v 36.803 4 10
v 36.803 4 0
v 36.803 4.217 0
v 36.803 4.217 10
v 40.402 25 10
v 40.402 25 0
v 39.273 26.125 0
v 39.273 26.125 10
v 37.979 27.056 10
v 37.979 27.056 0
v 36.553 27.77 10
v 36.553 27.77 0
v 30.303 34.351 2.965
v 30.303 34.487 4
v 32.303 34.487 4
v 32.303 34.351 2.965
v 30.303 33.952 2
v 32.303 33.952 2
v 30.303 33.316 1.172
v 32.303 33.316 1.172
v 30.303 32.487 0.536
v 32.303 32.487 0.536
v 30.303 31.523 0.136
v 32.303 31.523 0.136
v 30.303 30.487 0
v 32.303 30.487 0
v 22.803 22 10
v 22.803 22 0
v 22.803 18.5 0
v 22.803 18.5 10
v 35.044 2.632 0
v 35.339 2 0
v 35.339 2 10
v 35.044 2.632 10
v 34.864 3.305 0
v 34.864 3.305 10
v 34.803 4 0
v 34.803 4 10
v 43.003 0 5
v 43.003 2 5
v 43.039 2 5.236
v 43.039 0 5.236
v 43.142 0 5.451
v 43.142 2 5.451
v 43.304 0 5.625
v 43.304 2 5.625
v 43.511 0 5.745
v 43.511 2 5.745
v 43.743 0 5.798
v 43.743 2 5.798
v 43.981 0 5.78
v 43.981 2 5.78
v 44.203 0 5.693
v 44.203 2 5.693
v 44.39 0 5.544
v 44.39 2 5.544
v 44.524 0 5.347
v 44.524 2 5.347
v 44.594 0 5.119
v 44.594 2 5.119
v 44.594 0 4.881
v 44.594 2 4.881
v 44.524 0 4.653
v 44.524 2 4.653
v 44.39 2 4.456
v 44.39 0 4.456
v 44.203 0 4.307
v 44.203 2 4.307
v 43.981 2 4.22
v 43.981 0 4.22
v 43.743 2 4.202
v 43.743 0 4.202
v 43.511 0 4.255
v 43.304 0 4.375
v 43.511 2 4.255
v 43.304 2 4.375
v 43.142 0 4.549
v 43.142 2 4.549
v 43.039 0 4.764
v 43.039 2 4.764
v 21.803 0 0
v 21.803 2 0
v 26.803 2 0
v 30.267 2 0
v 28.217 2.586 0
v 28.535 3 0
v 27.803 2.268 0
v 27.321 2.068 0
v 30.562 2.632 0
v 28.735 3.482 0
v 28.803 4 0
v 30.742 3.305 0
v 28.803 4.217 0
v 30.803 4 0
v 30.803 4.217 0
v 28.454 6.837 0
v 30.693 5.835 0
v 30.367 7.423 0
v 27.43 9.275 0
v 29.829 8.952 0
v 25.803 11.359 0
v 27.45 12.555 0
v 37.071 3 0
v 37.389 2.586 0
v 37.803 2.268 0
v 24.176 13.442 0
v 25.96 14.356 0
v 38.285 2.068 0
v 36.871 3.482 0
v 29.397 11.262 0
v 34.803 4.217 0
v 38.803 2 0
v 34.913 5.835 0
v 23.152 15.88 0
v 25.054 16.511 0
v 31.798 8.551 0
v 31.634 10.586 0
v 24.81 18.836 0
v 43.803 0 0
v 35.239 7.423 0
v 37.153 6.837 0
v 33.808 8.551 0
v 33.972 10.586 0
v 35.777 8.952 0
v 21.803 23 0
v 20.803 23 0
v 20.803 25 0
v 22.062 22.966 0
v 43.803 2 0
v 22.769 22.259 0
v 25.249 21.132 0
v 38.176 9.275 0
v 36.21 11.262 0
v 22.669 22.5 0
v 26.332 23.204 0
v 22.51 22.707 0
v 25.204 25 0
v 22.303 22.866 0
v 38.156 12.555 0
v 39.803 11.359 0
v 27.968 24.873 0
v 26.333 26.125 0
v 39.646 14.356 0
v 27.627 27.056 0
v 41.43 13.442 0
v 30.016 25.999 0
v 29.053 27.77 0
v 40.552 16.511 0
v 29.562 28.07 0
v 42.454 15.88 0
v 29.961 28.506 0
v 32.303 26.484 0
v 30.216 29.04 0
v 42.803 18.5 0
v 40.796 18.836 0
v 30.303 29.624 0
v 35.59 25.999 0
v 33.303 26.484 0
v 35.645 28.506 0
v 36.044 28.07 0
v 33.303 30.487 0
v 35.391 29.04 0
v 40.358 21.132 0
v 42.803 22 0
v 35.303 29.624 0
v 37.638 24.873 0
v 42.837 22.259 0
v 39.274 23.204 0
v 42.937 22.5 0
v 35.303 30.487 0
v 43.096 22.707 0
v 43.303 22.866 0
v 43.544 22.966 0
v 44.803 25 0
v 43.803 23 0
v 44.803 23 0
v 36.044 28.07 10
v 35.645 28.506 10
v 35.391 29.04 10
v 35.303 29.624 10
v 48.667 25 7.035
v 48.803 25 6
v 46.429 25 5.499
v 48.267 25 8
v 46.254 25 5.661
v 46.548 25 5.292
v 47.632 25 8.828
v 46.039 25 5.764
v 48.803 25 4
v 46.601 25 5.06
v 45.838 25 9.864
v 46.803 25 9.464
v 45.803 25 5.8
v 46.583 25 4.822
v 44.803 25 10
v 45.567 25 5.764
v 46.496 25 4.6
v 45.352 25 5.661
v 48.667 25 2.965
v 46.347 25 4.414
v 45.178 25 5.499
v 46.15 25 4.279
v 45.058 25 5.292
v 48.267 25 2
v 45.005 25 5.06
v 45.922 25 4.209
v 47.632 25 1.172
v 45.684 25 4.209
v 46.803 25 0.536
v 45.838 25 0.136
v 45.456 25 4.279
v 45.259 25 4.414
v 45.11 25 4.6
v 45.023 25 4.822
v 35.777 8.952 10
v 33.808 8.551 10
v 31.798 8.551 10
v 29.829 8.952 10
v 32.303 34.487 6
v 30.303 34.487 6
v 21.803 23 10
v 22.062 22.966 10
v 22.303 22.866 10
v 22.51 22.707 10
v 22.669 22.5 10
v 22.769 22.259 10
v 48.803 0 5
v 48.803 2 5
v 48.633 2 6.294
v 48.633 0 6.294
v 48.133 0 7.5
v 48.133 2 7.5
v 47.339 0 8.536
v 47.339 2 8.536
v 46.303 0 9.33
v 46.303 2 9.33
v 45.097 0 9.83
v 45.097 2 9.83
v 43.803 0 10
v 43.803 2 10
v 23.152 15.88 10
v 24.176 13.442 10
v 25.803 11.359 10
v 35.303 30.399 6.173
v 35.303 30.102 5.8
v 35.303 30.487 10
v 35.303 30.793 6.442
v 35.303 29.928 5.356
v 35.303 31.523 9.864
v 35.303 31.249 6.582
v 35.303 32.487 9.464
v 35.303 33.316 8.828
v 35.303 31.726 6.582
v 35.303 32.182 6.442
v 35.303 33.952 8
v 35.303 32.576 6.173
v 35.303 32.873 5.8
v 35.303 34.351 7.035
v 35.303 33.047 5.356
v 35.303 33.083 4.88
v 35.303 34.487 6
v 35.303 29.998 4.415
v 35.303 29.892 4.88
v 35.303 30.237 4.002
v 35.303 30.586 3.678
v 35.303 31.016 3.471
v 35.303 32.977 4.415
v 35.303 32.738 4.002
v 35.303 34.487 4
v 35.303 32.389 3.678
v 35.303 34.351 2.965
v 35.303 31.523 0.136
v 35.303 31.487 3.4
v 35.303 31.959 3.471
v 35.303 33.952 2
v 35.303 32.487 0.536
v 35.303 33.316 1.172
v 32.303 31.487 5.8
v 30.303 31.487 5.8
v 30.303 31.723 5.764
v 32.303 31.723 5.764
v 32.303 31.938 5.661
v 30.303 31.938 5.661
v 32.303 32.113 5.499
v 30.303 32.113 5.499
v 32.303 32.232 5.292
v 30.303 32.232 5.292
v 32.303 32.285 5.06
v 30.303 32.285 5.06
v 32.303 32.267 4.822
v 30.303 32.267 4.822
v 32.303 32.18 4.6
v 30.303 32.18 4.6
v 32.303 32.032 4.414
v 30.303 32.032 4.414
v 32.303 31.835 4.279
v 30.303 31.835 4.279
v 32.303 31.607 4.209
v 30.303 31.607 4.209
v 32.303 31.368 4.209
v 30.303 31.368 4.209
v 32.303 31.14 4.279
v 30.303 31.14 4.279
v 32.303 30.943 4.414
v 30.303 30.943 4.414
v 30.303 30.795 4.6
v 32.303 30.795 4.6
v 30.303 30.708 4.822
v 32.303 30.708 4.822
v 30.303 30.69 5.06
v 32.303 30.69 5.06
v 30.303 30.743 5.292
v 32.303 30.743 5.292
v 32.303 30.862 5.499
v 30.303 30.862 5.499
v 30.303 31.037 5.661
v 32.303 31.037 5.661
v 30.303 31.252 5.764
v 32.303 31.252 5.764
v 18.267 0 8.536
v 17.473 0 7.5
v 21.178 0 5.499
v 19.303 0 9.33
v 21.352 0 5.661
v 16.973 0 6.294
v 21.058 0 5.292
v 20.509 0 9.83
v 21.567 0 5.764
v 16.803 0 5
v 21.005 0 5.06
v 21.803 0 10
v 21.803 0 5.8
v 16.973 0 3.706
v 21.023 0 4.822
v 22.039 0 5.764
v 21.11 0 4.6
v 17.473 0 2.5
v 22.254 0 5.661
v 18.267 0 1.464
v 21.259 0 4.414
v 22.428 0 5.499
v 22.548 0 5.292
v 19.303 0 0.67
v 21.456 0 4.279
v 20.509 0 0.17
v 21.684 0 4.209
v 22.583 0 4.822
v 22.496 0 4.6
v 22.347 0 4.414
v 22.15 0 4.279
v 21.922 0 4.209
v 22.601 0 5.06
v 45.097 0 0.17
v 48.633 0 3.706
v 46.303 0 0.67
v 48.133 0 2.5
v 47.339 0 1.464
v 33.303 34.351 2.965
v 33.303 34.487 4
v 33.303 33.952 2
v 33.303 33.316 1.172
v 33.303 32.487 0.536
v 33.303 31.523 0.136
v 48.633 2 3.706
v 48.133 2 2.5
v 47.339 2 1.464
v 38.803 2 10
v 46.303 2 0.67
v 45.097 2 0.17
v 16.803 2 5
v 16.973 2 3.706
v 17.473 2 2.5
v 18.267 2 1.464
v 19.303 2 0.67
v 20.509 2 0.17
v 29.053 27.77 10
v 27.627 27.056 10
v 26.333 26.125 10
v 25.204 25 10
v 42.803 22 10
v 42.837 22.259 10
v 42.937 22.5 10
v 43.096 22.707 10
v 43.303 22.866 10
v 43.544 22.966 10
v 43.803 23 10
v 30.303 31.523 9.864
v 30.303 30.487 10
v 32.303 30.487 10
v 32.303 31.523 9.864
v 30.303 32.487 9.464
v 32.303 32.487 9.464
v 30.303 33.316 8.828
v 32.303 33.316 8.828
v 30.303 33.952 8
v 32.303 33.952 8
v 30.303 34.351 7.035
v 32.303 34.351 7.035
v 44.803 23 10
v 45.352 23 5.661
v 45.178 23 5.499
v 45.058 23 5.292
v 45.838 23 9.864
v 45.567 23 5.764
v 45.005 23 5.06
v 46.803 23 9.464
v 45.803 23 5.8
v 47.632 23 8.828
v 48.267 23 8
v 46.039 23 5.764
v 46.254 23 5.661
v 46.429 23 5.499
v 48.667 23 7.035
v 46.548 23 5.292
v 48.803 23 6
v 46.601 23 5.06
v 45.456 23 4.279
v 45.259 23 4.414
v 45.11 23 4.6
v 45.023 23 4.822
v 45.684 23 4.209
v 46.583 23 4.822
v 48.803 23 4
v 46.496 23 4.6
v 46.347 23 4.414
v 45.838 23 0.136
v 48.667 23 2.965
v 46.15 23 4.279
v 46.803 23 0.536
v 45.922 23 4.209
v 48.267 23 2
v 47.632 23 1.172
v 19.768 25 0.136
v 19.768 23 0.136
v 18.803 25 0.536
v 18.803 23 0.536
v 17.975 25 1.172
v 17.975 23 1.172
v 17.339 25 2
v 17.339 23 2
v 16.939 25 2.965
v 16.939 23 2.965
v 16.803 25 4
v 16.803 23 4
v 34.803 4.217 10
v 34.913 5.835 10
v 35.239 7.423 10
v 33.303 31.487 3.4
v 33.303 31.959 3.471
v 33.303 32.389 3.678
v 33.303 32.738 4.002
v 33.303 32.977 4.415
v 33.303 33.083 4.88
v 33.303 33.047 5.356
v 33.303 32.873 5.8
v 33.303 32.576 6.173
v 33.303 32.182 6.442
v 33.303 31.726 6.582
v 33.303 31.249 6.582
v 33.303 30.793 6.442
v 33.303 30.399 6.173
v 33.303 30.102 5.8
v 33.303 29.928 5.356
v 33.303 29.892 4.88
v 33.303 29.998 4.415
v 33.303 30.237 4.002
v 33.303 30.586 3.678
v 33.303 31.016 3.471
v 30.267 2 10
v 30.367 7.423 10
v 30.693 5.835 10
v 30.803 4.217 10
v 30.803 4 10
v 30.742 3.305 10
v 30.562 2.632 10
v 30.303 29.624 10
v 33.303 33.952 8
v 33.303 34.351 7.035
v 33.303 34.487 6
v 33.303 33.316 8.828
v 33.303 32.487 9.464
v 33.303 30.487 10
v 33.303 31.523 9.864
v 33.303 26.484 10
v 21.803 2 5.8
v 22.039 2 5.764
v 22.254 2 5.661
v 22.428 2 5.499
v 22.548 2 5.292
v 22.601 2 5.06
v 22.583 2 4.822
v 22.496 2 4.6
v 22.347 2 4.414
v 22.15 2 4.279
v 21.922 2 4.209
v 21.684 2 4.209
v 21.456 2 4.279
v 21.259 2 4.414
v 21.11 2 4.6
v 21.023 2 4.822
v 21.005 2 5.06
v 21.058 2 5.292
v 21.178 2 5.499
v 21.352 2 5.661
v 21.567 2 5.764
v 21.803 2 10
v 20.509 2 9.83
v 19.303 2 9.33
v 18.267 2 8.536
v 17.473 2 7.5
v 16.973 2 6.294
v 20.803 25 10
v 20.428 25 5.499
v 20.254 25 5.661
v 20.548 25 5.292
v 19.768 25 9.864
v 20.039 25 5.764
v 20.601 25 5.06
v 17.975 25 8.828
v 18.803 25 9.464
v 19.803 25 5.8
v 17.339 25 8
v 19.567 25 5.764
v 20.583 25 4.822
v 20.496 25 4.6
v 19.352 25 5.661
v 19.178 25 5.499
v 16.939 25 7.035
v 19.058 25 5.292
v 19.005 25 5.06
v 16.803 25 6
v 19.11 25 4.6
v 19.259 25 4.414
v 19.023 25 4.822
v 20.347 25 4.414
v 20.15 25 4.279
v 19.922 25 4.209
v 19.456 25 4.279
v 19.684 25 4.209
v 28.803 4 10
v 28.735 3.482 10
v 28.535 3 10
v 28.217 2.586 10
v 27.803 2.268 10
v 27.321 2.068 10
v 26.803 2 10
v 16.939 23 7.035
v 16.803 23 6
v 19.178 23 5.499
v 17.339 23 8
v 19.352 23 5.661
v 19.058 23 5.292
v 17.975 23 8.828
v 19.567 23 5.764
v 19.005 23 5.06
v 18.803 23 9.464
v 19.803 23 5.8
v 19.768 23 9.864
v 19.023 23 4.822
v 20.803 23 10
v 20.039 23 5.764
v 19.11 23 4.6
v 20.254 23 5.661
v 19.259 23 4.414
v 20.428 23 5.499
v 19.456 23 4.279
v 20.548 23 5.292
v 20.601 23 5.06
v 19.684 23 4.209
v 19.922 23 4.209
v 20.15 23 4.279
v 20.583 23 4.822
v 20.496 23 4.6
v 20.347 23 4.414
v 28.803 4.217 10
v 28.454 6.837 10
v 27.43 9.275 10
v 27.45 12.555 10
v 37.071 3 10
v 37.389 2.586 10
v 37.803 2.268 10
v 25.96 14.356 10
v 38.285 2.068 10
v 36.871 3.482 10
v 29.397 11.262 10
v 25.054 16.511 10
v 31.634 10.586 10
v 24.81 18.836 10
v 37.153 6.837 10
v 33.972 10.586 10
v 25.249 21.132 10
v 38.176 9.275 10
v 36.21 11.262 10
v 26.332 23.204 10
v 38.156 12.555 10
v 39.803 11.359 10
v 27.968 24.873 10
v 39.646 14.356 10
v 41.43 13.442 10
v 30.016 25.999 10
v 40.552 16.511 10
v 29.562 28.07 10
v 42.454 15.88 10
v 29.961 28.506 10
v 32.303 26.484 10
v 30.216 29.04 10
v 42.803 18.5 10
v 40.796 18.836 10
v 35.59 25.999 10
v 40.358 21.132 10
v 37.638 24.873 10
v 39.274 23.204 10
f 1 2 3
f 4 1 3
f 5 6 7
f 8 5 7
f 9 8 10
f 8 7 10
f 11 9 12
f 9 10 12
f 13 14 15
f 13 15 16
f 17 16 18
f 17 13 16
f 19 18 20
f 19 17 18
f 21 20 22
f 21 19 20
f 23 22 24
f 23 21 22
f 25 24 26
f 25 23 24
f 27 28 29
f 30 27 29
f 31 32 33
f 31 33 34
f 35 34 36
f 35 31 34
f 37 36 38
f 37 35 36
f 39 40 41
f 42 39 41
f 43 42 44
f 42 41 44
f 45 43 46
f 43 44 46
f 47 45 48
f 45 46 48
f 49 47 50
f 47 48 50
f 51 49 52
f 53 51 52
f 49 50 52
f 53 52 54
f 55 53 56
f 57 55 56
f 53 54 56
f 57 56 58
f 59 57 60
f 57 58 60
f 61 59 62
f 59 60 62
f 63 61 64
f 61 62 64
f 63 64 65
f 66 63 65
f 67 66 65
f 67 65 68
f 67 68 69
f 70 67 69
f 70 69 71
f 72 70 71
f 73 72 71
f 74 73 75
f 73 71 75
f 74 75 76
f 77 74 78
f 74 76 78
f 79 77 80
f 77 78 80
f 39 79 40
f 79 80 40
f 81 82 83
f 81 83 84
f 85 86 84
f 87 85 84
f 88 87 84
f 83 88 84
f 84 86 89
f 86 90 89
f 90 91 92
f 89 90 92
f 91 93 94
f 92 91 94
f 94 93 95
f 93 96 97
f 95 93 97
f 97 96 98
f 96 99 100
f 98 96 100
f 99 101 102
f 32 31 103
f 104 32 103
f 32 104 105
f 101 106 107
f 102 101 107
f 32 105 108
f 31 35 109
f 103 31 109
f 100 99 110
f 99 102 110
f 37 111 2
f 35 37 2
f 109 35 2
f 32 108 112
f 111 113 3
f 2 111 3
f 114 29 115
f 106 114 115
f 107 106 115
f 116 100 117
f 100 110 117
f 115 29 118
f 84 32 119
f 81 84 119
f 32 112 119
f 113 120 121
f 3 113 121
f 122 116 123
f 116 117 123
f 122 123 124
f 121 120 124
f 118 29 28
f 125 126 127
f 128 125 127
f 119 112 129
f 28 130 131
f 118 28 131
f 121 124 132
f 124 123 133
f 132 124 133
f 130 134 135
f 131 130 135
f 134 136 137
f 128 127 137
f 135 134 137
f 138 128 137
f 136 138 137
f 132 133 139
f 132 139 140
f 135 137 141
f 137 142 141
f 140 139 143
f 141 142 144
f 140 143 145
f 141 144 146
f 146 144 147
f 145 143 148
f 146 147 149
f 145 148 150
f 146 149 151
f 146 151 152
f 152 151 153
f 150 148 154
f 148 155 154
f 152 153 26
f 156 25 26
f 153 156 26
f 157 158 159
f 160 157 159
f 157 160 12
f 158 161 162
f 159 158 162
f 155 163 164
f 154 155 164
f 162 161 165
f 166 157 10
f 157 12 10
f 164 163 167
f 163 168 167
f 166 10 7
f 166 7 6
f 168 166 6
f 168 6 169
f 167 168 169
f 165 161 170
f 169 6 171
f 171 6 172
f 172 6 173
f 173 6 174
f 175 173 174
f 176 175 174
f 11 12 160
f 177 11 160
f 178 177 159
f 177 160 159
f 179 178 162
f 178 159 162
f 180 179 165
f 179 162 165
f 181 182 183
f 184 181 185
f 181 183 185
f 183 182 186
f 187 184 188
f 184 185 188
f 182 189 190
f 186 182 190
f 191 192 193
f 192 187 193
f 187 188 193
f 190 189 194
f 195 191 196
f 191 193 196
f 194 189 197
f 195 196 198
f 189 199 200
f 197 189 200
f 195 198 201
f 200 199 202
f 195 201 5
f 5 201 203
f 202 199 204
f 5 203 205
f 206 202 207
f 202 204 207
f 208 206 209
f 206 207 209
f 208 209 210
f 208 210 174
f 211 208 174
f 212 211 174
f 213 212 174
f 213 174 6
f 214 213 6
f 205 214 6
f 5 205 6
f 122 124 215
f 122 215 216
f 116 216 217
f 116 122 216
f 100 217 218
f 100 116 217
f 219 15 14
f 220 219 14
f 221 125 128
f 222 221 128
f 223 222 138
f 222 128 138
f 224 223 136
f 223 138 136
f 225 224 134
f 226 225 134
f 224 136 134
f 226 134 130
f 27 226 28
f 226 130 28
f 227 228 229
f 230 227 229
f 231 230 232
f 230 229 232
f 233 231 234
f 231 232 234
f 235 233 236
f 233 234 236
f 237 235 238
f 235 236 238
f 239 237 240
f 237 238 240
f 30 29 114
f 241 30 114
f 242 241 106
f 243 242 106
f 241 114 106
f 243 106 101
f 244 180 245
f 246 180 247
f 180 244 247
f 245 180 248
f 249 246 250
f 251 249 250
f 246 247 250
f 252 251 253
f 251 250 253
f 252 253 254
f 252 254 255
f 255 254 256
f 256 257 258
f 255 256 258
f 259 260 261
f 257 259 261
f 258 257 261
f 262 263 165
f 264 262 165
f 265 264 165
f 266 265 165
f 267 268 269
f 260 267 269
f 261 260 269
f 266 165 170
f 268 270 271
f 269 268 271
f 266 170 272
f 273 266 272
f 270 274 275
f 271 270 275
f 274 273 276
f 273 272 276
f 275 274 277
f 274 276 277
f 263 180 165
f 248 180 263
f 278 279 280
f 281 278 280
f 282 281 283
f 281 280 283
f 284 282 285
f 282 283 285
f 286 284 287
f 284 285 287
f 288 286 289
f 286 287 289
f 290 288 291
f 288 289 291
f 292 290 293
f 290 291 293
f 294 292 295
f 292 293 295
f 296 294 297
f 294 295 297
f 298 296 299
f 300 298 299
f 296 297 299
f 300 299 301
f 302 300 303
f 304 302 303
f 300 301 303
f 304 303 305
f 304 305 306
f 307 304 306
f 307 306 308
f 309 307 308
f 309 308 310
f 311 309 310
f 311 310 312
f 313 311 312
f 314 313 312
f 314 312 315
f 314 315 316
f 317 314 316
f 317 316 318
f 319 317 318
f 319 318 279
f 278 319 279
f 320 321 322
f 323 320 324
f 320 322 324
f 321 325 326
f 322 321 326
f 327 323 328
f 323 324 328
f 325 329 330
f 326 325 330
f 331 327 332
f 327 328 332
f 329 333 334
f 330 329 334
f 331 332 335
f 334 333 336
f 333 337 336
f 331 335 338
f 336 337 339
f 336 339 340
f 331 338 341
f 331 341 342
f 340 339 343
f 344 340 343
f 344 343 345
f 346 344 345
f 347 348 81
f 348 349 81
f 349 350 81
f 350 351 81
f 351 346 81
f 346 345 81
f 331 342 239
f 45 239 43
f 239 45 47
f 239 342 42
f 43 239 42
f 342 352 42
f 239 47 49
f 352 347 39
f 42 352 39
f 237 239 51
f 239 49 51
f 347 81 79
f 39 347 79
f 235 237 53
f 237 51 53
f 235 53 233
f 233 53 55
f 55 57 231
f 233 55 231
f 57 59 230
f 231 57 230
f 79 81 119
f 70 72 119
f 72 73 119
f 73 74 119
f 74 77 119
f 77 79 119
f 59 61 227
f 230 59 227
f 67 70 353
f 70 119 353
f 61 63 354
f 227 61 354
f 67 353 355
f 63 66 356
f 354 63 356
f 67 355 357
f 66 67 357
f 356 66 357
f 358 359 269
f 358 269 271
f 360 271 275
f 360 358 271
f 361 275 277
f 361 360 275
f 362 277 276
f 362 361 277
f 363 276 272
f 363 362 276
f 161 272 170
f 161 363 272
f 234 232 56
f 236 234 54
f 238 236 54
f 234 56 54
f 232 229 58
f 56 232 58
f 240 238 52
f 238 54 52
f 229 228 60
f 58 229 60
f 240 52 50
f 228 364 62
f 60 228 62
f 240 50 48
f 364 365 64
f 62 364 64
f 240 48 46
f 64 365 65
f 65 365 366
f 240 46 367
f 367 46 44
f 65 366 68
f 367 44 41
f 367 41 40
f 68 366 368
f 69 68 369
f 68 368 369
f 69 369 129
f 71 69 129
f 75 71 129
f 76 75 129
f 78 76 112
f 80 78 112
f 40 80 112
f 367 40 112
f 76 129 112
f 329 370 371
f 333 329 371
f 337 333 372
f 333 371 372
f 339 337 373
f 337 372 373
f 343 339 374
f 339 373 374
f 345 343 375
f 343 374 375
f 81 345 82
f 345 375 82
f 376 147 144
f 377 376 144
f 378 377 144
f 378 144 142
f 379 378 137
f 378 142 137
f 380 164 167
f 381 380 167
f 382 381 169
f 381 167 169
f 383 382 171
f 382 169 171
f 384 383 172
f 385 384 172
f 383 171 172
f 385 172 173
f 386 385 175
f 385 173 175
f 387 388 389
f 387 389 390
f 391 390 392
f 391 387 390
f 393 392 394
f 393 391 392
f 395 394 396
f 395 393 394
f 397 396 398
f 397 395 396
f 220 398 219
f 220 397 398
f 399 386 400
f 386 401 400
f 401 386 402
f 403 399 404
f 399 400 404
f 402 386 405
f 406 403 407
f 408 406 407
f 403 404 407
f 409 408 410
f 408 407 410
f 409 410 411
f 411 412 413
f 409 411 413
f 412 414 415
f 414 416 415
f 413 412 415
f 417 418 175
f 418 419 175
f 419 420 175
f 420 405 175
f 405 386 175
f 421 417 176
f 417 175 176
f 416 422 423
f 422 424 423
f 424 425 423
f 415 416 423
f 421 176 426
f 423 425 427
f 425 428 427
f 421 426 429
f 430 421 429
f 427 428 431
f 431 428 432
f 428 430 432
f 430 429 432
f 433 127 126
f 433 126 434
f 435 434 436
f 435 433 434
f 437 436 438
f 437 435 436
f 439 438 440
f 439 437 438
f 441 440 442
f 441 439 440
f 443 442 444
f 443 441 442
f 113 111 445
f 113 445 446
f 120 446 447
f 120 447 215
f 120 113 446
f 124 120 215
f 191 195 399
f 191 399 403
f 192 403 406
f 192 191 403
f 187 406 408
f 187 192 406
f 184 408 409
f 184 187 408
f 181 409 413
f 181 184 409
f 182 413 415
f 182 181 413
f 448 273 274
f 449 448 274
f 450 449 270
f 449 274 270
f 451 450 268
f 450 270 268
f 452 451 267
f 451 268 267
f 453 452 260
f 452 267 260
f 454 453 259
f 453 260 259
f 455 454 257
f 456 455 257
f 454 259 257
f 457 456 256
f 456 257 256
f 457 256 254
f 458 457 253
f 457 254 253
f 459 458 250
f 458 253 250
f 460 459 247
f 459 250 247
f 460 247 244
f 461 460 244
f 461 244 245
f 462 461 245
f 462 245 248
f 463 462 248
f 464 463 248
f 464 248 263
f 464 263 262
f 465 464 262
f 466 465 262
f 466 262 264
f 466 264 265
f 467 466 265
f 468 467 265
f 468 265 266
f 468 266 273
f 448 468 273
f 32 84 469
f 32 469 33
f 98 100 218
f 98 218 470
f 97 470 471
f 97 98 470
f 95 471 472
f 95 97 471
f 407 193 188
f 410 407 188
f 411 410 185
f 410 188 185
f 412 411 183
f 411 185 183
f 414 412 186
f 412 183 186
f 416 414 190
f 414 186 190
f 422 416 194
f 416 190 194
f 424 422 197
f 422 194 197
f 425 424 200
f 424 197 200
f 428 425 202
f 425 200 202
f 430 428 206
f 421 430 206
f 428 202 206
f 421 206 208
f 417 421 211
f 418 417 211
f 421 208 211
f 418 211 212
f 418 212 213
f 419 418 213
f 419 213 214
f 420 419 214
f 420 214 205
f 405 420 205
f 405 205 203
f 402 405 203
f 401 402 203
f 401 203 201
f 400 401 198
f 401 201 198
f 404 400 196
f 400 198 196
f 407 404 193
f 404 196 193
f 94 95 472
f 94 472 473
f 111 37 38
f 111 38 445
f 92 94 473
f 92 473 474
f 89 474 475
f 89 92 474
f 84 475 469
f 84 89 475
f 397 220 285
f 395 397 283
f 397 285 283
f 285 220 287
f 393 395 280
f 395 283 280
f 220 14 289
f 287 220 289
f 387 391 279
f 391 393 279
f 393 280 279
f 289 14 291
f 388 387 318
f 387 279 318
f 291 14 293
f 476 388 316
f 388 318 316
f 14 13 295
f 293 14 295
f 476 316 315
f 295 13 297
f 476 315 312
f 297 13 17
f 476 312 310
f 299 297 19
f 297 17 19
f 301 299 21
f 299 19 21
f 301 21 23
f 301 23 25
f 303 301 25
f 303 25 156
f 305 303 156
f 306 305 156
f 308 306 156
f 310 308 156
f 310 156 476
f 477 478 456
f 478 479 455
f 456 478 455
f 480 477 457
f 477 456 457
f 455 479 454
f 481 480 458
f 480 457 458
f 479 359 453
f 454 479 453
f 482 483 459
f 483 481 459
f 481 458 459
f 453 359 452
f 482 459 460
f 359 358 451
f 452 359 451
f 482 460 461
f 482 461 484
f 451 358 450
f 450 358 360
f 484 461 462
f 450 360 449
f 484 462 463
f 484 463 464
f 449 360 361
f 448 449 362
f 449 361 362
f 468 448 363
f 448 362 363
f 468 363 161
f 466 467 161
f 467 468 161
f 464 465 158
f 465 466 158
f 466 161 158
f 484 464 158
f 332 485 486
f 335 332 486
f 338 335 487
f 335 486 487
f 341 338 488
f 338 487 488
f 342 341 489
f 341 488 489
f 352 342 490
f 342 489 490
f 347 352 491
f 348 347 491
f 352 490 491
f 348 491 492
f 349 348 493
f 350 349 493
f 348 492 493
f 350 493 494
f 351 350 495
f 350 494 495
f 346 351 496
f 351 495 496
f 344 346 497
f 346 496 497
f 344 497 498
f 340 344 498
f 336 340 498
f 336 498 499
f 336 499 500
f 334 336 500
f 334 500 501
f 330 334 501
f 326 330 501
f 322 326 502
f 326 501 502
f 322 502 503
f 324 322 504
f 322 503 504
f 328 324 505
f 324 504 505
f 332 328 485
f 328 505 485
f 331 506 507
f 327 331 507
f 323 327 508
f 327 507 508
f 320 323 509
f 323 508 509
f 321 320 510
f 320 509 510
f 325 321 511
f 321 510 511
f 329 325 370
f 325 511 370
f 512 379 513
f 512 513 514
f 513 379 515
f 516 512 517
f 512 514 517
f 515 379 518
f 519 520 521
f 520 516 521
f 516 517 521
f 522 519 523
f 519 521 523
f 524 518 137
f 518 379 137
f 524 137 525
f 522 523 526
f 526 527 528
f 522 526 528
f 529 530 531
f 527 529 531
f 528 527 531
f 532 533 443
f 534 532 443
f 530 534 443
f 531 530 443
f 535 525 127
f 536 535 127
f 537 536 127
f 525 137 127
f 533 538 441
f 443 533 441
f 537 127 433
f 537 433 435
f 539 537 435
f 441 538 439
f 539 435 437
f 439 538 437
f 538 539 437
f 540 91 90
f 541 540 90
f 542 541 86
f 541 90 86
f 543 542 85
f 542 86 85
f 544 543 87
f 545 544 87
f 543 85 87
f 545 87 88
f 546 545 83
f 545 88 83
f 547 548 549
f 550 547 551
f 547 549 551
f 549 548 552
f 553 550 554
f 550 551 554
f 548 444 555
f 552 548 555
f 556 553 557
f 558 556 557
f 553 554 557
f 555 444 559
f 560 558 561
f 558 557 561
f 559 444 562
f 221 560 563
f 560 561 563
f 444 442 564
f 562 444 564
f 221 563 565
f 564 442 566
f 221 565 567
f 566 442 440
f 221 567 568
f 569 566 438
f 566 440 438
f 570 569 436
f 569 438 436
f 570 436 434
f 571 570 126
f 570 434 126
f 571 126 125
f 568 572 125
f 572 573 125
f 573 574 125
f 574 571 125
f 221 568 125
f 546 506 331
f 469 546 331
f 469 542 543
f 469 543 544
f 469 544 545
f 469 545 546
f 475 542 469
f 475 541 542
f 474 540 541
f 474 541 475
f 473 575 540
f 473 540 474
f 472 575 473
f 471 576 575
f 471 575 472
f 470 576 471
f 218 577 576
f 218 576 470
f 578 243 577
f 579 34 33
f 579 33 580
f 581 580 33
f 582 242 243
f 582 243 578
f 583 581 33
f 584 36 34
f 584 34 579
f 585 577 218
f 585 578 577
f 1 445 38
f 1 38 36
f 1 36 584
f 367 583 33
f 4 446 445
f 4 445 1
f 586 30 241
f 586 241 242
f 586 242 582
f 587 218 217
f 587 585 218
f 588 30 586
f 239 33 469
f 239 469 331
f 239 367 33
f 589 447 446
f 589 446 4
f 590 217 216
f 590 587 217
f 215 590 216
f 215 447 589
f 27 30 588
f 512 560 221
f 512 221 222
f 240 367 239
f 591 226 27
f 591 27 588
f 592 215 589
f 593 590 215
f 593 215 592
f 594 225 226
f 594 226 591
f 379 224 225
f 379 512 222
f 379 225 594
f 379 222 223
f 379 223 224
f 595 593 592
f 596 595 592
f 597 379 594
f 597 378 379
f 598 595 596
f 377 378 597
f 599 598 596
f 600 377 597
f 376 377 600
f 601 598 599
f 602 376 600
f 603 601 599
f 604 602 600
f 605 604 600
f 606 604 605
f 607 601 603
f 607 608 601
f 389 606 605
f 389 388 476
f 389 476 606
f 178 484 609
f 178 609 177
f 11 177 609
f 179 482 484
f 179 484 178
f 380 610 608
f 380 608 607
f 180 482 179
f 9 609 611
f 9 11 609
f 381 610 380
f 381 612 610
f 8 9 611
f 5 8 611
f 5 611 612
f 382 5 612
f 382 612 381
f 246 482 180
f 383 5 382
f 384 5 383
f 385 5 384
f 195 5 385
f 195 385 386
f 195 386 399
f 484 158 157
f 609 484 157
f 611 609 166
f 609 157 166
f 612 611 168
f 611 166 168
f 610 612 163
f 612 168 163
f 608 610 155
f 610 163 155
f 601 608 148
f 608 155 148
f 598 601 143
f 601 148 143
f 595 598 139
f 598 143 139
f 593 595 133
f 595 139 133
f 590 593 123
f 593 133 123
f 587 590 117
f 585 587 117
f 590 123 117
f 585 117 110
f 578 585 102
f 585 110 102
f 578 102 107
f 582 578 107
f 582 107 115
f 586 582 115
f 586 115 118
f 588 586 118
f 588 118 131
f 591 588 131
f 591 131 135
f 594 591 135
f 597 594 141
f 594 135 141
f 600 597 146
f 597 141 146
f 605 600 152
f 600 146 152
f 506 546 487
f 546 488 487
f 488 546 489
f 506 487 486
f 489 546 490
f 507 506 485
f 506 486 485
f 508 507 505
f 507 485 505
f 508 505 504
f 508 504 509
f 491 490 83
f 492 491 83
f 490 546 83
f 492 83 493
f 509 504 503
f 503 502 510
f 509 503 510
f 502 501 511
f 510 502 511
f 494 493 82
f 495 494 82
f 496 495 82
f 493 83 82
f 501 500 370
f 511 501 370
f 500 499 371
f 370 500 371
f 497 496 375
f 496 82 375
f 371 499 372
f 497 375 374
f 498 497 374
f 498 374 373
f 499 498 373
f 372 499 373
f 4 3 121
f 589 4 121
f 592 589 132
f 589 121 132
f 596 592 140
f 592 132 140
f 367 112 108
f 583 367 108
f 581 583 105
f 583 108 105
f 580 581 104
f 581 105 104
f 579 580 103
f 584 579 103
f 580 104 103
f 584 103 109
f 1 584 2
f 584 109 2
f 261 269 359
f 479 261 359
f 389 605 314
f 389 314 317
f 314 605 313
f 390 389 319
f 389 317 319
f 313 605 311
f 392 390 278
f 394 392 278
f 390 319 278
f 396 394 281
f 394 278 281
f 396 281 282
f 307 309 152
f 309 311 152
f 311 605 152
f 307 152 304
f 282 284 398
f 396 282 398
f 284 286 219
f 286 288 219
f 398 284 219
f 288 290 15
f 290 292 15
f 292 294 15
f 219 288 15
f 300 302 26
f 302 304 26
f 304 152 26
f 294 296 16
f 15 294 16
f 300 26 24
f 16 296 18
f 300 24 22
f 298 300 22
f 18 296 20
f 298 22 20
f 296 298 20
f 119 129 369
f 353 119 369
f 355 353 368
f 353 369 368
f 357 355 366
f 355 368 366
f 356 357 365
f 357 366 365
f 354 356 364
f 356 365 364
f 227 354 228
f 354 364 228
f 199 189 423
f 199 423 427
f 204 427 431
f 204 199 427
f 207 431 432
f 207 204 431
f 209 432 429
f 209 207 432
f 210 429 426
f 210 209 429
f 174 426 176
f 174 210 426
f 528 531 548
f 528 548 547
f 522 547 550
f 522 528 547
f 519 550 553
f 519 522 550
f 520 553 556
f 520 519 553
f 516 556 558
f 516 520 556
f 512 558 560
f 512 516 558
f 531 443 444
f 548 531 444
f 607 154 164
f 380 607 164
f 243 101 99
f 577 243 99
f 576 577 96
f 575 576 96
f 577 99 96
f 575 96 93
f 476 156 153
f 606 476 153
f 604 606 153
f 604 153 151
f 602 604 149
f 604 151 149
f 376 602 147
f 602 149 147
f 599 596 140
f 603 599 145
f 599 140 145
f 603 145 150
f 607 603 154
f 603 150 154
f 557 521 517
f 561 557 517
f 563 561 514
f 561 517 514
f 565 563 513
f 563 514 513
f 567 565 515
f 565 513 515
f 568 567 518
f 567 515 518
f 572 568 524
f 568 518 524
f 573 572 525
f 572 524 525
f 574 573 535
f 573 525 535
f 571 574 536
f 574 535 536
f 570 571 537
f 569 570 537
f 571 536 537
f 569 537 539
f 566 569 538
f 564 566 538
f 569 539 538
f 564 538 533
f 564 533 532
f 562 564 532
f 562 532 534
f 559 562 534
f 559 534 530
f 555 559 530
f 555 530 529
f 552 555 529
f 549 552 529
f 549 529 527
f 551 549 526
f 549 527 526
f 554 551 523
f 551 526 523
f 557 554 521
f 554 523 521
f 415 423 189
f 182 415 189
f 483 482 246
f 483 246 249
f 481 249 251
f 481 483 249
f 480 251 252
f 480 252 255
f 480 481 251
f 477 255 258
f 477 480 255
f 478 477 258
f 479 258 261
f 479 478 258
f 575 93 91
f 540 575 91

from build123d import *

# Parameters (mm, degrees)
BOSS_EXTRUDE1_DEPTH = 10
SKETCH3_R           = 0.8
CUT_EXTRUDE1_DEPTH  = 2
SKETCH4_R           = 0.8
CUT_EXTRUDE2_DEPTH  = 2
SKETCH5_R           = 0.8
CUT_EXTRUDE3_DEPTH  = 2
SKETCH6_R           = 0.8
CUT_EXTRUDE4_DEPTH  = 3
SKETCH7_R           = 1.6
CUT_EXTRUDE5_DEPTH  = 3
CUT_EXTRUDE6_DEPTH  = 10


with BuildPart() as part:
    # Sketch1 → Boss-Extrude1 (new body)
    with BuildSketch(Plane.XY):
        with BuildLine():
            Line((16.803004448, 0), (48.803096805, 0))
            Line((48.803096805, 0), (48.803096805, 2))
            Line((48.803096805, 2), (38.803096805, 2))
            ThreePointArc((38.803096805, 2), (37.388883243, 2.585786438), (36.803096805, 4))
            Line((36.803096805, 4), (36.803096805, 4.217123744))
            ThreePointArc((36.803096805, 4.217123744), (37.58355047, 8.090102619), (39.803089878, 11.358545383))
            ThreePointArc((39.803089878, 11.358545383), (42.022639537, 14.62700324), (42.803096805, 18.5))
            Line((42.803096805, 18.5), (42.803096805, 22))
            ThreePointArc((42.803096805, 22), (43.095990024, 22.707106781), (43.803096805, 23))
            Line((43.803096805, 23), (48.803096805, 23))
            Line((48.803096805, 23), (48.803096805, 25))
            Line((48.803096805, 25), (44.105786895, 25))
            Line((44.105786895, 25), (40.40245347, 25))
            ThreePointArc((40.40245347, 25), (38.644426823, 26.616603213), (36.553207437, 27.770234489))
            ThreePointArc((36.553207437, 27.770234489), (35.644914528, 28.506251313), (35.303235335, 29.624272825))
            Line((35.303235335, 29.624272825), (35.303235335, 34.487492178))
            Line((35.303235335, 34.487492178), (33.303050626, 34.487492178))
            Line((33.303050626, 34.487492178), (33.303050626, 26.484348185))
            ThreePointArc((33.303050626, 26.484348185), (32.803050626, 10.500011503), (32.303050626, 26.484348185))
            Line((32.303050626, 26.484348185), (32.303050626, 34.487492178))
            Line((32.303050626, 34.487492178), (30.303050626, 34.487492178))
            Line((30.303050626, 34.487492178), (30.303050626, 29.624347545))
            ThreePointArc((30.303050626, 29.624347545), (29.961362151, 28.506312265), (29.05304774, 27.770296755))
            ThreePointArc((29.05304774, 27.770296755), (26.961741815, 26.616651708), (25.203647783, 25))
            Line((25.203647783, 25), (21.500314358, 25))
            Line((21.500314358, 25), (16.803004448, 25))
            Line((16.803004448, 25), (16.803004448, 23))
            Line((16.803004448, 23), (21.803004448, 23))
            ThreePointArc((21.803004448, 23), (22.510111229, 22.707106781), (22.803004448, 22))
            Line((22.803004448, 22), (22.803004448, 18.5))
            ThreePointArc((22.803004448, 18.5), (23.583461716, 14.62700324), (25.803011375, 11.358545383))
            ThreePointArc((25.803011375, 11.358545383), (28.022550783, 8.090102619), (28.803004448, 4.217123744))
            Line((28.803004448, 4.217123744), (28.803004448, 4))
            ThreePointArc((28.803004448, 4), (28.21721801, 2.585786438), (26.803004448, 2))
            Line((26.803004448, 2), (16.803004448, 2))
            Line((16.803004448, 2), (16.803004448, 0))
        make_face()
        with BuildLine():
            Line((34.803096805, 4), (34.803096805, 4.217123744))
            ThreePointArc((34.803096805, 4.217123744), (35.049071096, 6.634328662), (35.776910074, 8.952438536))
            ThreePointArc((35.776910074, 8.952438536), (32.803050626, 8.500011503), (29.829191179, 8.952438536))
            ThreePointArc((29.829191179, 8.952438536), (30.557030157, 6.634328662), (30.803004448, 4.217123744))
            Line((30.803004448, 4.217123744), (30.803004448, 4))
            ThreePointArc((30.803004448, 4), (30.666707753, 2.96472382), (30.267106063, 2))
            Line((30.267106063, 2), (35.33899519, 2))
            ThreePointArc((35.33899519, 2), (34.9393935, 2.96472382), (34.803096805, 4))
        make_face(mode=Mode.SUBTRACT)
    extrude(amount=BOSS_EXTRUDE1_DEPTH)

    # Sketch3 → Cut-Extrude1 (cut)
    with BuildSketch(Plane(origin=(0, 2, 0), x_dir=(1, 0, 0), z_dir=(0, 1, 0))):
        with BuildLine():
            ThreePointArc((48.803096805, -5), (47.338630711, -8.535533906), (43.803096805, -10))
            Line((43.803096805, -10), (48.803096805, -10))
            Line((48.803096805, -10), (48.803096805, -5))
        make_face()
        with BuildLine():
            ThreePointArc((43.803096805, 0), (47.338630711, -1.464466094), (48.803096805, -5))
            Line((48.803096805, -5), (48.803096805, 0))
            Line((48.803096805, 0), (43.803096805, 0))
        make_face()
        with Locations((43.803096805, -5)):
            Circle(SKETCH3_R)
    extrude(amount=-CUT_EXTRUDE1_DEPTH, mode=Mode.SUBTRACT)

    # Sketch4 → Cut-Extrude2 (cut)
    with BuildSketch(Plane(origin=(0, 2, 0), x_dir=(1, 0, 0), z_dir=(0, 1, 0))):
        with BuildLine():
            Line((16.803004448, 0), (16.803004448, -5))
            ThreePointArc((16.803004448, -5), (18.267470542, -1.464466094), (21.803004448, 0))
            Line((21.803004448, 0), (16.803004448, 0))
        make_face()
        with BuildLine():
            Line((16.803004448, -10), (21.803004448, -10))
            ThreePointArc((21.803004448, -10), (18.267470542, -8.535533906), (16.803004448, -5))
            Line((16.803004448, -5), (16.803004448, -10))
        make_face()
        with Locations((21.803004448, -5)):
            Circle(SKETCH4_R)
    extrude(amount=-CUT_EXTRUDE2_DEPTH, mode=Mode.SUBTRACT)

    # Sketch5 → Cut-Extrude3 (cut)
    with BuildSketch(Plane(origin=(0, 25, 0), x_dir=(1, 0, 0), z_dir=(0, 1, 0))):
        with Locations((19.803004448, -5)):
            Circle(SKETCH5_R)
        with Locations((45.803096805, -5)):
            Circle(SKETCH5_R)
        with BuildLine():
            Line((20.803004448, -10), (16.803004448, -10))
            Line((16.803004448, -10), (16.803004448, -6))
            ThreePointArc((16.803004448, -6), (17.974577323, -8.828427125), (20.803004448, -10))
        make_face()
        with BuildLine():
            Line((16.803004448, -4), (16.803004448, 0))
            Line((16.803004448, 0), (20.803004448, 0))
            ThreePointArc((20.803004448, 0), (17.974577323, -1.171572875), (16.803004448, -4))
        make_face()
        with BuildLine():
            Line((44.803096805, 0), (48.803096805, 0))
            Line((48.803096805, 0), (48.803096805, -4))
            ThreePointArc((48.803096805, -4), (47.63152393, -1.171572875), (44.803096805, 0))
        make_face()
        with BuildLine():
            Line((48.803096805, -6), (48.803096805, -10))
            Line((48.803096805, -10), (44.803096805, -10))
            ThreePointArc((44.803096805, -10), (47.63152393, -8.828427125), (48.803096805, -6))
        make_face()
    extrude(amount=-CUT_EXTRUDE3_DEPTH, mode=Mode.SUBTRACT)

    # Sketch6 → Cut-Extrude4 (cut)
    with BuildSketch(Plane.ZY.offset(-30.303050626)):
        with Locations((5, 31.487492178)):
            Circle(SKETCH6_R)
    extrude(amount=-CUT_EXTRUDE4_DEPTH, mode=Mode.SUBTRACT)

    # Sketch7 → Cut-Extrude5 (cut)
    with BuildSketch(Plane(origin=(35.303235335, 0, 0), x_dir=(0, 0, -1), z_dir=(1, 0, 0))):
        with Locations((-5, 31.487492178)):
            Circle(SKETCH7_R)
    extrude(amount=-CUT_EXTRUDE5_DEPTH, mode=Mode.SUBTRACT)

    # Sketch8 → Cut-Extrude6 (cut)
    with BuildSketch(Plane.ZY.offset(-30.303050626)):
        with BuildLine():
            Line((0, 30.487492178), (0, 34.487492178))
            Line((0, 34.487492178), (4, 34.487492178))
            ThreePointArc((4, 34.487492178), (1.171572875, 33.315919302), (0, 30.487492178))
        make_face()
        with BuildLine():
            Line((6, 34.487492178), (10, 34.487492178))
            Line((10, 34.487492178), (10, 30.487492178))
            ThreePointArc((10, 30.487492178), (8.828427125, 33.315919302), (6, 34.487492178))
        make_face()
    extrude(amount=-CUT_EXTRUDE6_DEPTH, mode=Mode.SUBTRACT)


solid = part.part
